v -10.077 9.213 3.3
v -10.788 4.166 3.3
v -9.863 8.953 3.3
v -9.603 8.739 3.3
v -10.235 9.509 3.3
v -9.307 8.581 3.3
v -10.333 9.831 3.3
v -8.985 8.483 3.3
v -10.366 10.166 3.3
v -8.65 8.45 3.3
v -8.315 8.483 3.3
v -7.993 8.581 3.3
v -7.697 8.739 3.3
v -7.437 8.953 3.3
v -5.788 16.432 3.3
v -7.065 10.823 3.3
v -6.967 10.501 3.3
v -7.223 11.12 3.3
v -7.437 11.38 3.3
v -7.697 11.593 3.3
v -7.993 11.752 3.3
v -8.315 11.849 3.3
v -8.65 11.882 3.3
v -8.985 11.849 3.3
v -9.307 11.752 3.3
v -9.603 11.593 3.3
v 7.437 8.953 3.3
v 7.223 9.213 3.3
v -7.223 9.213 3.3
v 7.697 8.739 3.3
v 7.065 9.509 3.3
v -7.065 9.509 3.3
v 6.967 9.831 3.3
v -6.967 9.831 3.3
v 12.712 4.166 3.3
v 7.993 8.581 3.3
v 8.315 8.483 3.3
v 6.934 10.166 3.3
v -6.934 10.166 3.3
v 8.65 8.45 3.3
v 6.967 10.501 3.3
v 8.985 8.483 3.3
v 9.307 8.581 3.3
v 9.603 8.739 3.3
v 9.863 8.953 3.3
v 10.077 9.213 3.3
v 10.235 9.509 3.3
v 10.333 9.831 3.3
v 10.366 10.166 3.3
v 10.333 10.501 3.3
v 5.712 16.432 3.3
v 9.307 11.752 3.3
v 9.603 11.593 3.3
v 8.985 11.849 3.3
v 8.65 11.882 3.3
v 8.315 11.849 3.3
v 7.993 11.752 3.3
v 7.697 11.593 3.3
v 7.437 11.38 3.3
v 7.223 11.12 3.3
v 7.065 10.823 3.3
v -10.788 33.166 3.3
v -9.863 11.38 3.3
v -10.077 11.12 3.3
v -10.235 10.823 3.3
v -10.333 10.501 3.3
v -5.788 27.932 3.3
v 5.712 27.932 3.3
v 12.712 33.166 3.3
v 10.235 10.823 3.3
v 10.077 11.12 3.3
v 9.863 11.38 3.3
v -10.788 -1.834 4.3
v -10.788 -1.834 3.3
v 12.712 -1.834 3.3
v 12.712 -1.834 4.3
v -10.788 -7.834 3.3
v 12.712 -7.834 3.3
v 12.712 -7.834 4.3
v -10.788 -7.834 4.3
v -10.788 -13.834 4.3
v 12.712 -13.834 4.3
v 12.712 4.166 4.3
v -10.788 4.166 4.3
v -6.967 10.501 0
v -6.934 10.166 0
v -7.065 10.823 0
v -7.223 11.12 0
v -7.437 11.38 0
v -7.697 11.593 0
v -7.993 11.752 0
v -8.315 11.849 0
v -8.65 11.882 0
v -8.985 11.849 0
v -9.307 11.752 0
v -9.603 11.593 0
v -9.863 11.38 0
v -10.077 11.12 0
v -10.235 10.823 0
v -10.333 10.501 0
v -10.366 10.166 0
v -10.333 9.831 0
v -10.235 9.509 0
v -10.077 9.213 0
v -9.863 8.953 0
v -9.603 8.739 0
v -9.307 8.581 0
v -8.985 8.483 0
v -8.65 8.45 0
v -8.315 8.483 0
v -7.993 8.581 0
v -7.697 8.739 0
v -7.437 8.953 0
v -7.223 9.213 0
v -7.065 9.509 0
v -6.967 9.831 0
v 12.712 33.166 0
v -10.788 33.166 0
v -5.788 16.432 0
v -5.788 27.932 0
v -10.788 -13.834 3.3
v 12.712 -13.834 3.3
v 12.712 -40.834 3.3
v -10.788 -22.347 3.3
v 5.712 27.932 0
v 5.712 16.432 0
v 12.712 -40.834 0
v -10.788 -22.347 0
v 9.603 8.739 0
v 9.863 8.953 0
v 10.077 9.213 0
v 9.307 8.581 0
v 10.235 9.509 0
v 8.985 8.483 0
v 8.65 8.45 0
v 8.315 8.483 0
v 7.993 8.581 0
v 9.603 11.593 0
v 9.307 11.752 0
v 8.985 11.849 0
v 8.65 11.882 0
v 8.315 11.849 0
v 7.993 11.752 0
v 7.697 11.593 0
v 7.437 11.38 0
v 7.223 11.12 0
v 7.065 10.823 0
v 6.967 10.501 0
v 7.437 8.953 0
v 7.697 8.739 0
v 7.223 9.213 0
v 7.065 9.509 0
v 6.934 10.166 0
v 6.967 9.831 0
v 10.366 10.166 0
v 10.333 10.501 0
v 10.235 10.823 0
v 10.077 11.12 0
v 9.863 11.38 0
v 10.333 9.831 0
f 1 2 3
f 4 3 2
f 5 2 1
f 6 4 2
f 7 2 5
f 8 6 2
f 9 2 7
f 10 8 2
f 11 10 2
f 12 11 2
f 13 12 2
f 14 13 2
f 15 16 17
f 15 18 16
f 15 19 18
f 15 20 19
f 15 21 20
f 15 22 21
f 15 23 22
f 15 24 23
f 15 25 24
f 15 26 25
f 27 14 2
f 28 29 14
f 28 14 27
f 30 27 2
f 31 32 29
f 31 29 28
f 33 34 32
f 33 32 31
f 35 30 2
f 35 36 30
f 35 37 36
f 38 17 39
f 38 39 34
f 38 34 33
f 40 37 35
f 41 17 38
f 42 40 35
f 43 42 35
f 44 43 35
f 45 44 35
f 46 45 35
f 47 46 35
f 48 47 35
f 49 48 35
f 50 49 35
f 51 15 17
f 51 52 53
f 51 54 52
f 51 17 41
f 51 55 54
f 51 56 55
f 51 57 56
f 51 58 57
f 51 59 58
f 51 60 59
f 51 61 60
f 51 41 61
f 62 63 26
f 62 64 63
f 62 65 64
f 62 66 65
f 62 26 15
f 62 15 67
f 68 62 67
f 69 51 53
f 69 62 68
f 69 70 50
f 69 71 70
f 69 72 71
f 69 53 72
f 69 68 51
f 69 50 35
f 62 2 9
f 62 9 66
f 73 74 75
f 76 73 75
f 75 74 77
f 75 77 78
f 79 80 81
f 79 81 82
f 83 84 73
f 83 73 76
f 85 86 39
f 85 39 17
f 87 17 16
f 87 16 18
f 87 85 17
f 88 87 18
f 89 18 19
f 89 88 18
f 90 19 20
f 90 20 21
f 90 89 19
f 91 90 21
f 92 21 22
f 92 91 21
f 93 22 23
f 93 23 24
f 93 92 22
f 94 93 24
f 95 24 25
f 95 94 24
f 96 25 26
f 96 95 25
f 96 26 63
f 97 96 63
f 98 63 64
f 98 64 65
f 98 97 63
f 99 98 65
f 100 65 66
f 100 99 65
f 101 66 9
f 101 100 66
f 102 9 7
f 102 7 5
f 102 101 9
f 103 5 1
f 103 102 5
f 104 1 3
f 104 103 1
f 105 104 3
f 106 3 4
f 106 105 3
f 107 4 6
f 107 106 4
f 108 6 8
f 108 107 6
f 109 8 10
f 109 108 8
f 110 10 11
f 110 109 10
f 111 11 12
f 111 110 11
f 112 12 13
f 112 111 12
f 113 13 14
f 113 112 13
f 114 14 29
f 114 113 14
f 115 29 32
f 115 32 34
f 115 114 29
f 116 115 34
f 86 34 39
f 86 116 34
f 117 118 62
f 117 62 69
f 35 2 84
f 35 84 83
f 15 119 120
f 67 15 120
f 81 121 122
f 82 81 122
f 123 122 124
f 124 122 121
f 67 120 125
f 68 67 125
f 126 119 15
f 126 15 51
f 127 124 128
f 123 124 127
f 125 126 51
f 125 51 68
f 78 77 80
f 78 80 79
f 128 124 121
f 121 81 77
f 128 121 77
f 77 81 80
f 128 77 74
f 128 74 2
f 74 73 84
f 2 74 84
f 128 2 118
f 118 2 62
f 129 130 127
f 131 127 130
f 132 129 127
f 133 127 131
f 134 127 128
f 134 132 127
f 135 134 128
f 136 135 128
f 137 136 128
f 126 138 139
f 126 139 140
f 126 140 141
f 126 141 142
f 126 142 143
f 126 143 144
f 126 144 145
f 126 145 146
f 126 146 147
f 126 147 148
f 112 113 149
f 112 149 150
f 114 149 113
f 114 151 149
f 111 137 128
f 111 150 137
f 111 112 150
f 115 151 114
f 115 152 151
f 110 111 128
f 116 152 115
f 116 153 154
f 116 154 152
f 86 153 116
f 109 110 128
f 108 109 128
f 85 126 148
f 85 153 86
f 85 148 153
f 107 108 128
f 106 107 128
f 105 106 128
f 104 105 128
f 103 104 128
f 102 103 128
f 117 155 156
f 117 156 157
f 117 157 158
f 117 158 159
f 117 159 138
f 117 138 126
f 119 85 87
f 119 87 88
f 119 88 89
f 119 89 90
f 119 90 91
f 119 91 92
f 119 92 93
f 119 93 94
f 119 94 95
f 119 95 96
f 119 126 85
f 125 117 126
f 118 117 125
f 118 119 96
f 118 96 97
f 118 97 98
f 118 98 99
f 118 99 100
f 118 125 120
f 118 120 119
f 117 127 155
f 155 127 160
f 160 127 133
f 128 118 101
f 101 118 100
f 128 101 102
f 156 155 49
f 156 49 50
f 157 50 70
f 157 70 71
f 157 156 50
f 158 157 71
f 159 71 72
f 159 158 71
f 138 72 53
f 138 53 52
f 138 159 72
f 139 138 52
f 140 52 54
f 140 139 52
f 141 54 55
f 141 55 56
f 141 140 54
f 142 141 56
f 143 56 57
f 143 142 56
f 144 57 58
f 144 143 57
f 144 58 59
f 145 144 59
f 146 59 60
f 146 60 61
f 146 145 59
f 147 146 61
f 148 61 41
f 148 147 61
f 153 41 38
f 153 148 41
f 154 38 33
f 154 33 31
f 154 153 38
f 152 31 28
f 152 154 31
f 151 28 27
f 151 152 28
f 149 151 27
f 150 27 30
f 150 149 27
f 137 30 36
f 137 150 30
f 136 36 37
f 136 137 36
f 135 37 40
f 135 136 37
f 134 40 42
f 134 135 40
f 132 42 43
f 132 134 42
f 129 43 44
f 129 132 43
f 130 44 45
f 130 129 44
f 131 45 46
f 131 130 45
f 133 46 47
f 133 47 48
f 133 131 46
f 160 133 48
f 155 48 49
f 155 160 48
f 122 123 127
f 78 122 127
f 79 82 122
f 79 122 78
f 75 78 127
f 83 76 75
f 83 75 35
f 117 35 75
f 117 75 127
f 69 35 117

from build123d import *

# Parameters (mm, degrees)
SKETCH_1_W          = 30.50790567
SKETCH_1_H          = 76
SKETCH_1_R          = 1.716069694
SKETCH_1_W_2        = 11.5
SKETCH_1_H_2        = 11.5
SKETCH_1_W_3        = 24.50790567
SKETCH_1_H_3        = 19
EXTRUDE_1_DEPTH     = 3.3
SKETCH_2_W          = 30.50790567
SKETCH_2_H          = 6
EXTRUDE_2_DEPTH     = 1
EXTRUDE_3_DEPTH     = 3.3
CUT_EXTRUDE_1_DEPTH = 3.3
EXTRUDE_5_DEPTH     = 3.3
SKETCH_6_W          = 30.50790567
SKETCH_6_H          = 24.027073242
EXTRUDE_6_DEPTH     = 3.3
CUT_EXTRUDE_3_DEPTH = 3.3
SKETCH_8_W          = 4.466233575
SKETCH_8_H          = 58.072220184
SKETCH_8_W_2        = 2.541672095
SKETCH_8_H_2        = 76
CUT_EXTRUDE_4_DEPTH = 11.3


with BuildPart() as part:
    # 草圖1 → 填料-伸長1 (new body)
    with BuildSketch(Plane.XY):
        with Locations((0, -4.833822083)):
            Rectangle(SKETCH_1_W, SKETCH_1_H)
        with Locations((-8.65, 10.166177917)):
            Circle(SKETCH_1_R, mode=Mode.SUBTRACT)
        with Locations((-0.03771926, 22.181861337)):
            Rectangle(SKETCH_1_W_2, SKETCH_1_H_2, mode=Mode.SUBTRACT)
        with Locations((8.65, 10.166177917)):
            Circle(SKETCH_1_R, mode=Mode.SUBTRACT)
        with Locations((0, -30.333822083)):
            Rectangle(SKETCH_1_W_3, SKETCH_1_H_3, mode=Mode.SUBTRACT)
    extrude(amount=EXTRUDE_1_DEPTH)

    # 草圖2 → 填料-伸長2 (add)
    with BuildSketch(Plane.XY.offset(3.3)):
        with Locations((0, 1.166177917)):
            Rectangle(SKETCH_2_W, SKETCH_2_H)
        with Locations((0, -10.833822083)):
            Rectangle(SKETCH_2_W, SKETCH_2_H)
    extrude(amount=EXTRUDE_2_DEPTH)

    # 草圖3 → 填料-伸長3 (add)
    with BuildSketch(Plane.XY):
        Polygon((15.253952835, -42.833822083), (-15.253952835, -18.474060109), (15.253952835, -18.474060109), align=None)
    extrude(amount=EXTRUDE_3_DEPTH)

    # 草圖4 → 除料-伸長1 (cut)
    with BuildSketch(Plane.XY.offset(3.3)):
        Polygon((15.253952835, -42.833822083), (-15.253952835, -18.806748841), (-15.253952835, -42.833822083), align=None)
    extrude(amount=-CUT_EXTRUDE_1_DEPTH, mode=Mode.SUBTRACT)

    # 草圖5 → 填料-伸長5 (add)
    with BuildSketch(Plane.XY.offset(3.3)):
        Polygon((15.253952835, -42.833822083), (-15.253952835, -42.833822083), (-15.253952835, -18.806748841), align=None)
    extrude(amount=-EXTRUDE_5_DEPTH)

    # 草圖6 → 填料-伸長6 (add)
    with BuildSketch(Plane.XY.offset(3.3)):
        with Locations((0, -30.820285462)):
            Rectangle(SKETCH_6_W, SKETCH_6_H)
    extrude(amount=-EXTRUDE_6_DEPTH)

    # 草圖7 → 除料-伸長3 (cut)
    with BuildSketch(Plane.XY.offset(3.3)):
        Polygon((-15.253952835, -18.833822083), (15.253952835, -42.833822083), (-15.253952835, -42.833822083), align=None)
    extrude(amount=-CUT_EXTRUDE_3_DEPTH, mode=Mode.SUBTRACT)

    # 草圖8 → 除料-伸長4 (cut)
    with BuildSketch(Plane.XY.offset(4.3)):
        with Locations((-13.020836048, 4.130067825)):
            Rectangle(SKETCH_8_W, SKETCH_8_H)
        with Locations((13.983116788, -4.833822083)):
            Rectangle(SKETCH_8_W_2, SKETCH_8_H_2)
    extrude(amount=-CUT_EXTRUDE_4_DEPTH, mode=Mode.SUBTRACT)


solid = part.part
